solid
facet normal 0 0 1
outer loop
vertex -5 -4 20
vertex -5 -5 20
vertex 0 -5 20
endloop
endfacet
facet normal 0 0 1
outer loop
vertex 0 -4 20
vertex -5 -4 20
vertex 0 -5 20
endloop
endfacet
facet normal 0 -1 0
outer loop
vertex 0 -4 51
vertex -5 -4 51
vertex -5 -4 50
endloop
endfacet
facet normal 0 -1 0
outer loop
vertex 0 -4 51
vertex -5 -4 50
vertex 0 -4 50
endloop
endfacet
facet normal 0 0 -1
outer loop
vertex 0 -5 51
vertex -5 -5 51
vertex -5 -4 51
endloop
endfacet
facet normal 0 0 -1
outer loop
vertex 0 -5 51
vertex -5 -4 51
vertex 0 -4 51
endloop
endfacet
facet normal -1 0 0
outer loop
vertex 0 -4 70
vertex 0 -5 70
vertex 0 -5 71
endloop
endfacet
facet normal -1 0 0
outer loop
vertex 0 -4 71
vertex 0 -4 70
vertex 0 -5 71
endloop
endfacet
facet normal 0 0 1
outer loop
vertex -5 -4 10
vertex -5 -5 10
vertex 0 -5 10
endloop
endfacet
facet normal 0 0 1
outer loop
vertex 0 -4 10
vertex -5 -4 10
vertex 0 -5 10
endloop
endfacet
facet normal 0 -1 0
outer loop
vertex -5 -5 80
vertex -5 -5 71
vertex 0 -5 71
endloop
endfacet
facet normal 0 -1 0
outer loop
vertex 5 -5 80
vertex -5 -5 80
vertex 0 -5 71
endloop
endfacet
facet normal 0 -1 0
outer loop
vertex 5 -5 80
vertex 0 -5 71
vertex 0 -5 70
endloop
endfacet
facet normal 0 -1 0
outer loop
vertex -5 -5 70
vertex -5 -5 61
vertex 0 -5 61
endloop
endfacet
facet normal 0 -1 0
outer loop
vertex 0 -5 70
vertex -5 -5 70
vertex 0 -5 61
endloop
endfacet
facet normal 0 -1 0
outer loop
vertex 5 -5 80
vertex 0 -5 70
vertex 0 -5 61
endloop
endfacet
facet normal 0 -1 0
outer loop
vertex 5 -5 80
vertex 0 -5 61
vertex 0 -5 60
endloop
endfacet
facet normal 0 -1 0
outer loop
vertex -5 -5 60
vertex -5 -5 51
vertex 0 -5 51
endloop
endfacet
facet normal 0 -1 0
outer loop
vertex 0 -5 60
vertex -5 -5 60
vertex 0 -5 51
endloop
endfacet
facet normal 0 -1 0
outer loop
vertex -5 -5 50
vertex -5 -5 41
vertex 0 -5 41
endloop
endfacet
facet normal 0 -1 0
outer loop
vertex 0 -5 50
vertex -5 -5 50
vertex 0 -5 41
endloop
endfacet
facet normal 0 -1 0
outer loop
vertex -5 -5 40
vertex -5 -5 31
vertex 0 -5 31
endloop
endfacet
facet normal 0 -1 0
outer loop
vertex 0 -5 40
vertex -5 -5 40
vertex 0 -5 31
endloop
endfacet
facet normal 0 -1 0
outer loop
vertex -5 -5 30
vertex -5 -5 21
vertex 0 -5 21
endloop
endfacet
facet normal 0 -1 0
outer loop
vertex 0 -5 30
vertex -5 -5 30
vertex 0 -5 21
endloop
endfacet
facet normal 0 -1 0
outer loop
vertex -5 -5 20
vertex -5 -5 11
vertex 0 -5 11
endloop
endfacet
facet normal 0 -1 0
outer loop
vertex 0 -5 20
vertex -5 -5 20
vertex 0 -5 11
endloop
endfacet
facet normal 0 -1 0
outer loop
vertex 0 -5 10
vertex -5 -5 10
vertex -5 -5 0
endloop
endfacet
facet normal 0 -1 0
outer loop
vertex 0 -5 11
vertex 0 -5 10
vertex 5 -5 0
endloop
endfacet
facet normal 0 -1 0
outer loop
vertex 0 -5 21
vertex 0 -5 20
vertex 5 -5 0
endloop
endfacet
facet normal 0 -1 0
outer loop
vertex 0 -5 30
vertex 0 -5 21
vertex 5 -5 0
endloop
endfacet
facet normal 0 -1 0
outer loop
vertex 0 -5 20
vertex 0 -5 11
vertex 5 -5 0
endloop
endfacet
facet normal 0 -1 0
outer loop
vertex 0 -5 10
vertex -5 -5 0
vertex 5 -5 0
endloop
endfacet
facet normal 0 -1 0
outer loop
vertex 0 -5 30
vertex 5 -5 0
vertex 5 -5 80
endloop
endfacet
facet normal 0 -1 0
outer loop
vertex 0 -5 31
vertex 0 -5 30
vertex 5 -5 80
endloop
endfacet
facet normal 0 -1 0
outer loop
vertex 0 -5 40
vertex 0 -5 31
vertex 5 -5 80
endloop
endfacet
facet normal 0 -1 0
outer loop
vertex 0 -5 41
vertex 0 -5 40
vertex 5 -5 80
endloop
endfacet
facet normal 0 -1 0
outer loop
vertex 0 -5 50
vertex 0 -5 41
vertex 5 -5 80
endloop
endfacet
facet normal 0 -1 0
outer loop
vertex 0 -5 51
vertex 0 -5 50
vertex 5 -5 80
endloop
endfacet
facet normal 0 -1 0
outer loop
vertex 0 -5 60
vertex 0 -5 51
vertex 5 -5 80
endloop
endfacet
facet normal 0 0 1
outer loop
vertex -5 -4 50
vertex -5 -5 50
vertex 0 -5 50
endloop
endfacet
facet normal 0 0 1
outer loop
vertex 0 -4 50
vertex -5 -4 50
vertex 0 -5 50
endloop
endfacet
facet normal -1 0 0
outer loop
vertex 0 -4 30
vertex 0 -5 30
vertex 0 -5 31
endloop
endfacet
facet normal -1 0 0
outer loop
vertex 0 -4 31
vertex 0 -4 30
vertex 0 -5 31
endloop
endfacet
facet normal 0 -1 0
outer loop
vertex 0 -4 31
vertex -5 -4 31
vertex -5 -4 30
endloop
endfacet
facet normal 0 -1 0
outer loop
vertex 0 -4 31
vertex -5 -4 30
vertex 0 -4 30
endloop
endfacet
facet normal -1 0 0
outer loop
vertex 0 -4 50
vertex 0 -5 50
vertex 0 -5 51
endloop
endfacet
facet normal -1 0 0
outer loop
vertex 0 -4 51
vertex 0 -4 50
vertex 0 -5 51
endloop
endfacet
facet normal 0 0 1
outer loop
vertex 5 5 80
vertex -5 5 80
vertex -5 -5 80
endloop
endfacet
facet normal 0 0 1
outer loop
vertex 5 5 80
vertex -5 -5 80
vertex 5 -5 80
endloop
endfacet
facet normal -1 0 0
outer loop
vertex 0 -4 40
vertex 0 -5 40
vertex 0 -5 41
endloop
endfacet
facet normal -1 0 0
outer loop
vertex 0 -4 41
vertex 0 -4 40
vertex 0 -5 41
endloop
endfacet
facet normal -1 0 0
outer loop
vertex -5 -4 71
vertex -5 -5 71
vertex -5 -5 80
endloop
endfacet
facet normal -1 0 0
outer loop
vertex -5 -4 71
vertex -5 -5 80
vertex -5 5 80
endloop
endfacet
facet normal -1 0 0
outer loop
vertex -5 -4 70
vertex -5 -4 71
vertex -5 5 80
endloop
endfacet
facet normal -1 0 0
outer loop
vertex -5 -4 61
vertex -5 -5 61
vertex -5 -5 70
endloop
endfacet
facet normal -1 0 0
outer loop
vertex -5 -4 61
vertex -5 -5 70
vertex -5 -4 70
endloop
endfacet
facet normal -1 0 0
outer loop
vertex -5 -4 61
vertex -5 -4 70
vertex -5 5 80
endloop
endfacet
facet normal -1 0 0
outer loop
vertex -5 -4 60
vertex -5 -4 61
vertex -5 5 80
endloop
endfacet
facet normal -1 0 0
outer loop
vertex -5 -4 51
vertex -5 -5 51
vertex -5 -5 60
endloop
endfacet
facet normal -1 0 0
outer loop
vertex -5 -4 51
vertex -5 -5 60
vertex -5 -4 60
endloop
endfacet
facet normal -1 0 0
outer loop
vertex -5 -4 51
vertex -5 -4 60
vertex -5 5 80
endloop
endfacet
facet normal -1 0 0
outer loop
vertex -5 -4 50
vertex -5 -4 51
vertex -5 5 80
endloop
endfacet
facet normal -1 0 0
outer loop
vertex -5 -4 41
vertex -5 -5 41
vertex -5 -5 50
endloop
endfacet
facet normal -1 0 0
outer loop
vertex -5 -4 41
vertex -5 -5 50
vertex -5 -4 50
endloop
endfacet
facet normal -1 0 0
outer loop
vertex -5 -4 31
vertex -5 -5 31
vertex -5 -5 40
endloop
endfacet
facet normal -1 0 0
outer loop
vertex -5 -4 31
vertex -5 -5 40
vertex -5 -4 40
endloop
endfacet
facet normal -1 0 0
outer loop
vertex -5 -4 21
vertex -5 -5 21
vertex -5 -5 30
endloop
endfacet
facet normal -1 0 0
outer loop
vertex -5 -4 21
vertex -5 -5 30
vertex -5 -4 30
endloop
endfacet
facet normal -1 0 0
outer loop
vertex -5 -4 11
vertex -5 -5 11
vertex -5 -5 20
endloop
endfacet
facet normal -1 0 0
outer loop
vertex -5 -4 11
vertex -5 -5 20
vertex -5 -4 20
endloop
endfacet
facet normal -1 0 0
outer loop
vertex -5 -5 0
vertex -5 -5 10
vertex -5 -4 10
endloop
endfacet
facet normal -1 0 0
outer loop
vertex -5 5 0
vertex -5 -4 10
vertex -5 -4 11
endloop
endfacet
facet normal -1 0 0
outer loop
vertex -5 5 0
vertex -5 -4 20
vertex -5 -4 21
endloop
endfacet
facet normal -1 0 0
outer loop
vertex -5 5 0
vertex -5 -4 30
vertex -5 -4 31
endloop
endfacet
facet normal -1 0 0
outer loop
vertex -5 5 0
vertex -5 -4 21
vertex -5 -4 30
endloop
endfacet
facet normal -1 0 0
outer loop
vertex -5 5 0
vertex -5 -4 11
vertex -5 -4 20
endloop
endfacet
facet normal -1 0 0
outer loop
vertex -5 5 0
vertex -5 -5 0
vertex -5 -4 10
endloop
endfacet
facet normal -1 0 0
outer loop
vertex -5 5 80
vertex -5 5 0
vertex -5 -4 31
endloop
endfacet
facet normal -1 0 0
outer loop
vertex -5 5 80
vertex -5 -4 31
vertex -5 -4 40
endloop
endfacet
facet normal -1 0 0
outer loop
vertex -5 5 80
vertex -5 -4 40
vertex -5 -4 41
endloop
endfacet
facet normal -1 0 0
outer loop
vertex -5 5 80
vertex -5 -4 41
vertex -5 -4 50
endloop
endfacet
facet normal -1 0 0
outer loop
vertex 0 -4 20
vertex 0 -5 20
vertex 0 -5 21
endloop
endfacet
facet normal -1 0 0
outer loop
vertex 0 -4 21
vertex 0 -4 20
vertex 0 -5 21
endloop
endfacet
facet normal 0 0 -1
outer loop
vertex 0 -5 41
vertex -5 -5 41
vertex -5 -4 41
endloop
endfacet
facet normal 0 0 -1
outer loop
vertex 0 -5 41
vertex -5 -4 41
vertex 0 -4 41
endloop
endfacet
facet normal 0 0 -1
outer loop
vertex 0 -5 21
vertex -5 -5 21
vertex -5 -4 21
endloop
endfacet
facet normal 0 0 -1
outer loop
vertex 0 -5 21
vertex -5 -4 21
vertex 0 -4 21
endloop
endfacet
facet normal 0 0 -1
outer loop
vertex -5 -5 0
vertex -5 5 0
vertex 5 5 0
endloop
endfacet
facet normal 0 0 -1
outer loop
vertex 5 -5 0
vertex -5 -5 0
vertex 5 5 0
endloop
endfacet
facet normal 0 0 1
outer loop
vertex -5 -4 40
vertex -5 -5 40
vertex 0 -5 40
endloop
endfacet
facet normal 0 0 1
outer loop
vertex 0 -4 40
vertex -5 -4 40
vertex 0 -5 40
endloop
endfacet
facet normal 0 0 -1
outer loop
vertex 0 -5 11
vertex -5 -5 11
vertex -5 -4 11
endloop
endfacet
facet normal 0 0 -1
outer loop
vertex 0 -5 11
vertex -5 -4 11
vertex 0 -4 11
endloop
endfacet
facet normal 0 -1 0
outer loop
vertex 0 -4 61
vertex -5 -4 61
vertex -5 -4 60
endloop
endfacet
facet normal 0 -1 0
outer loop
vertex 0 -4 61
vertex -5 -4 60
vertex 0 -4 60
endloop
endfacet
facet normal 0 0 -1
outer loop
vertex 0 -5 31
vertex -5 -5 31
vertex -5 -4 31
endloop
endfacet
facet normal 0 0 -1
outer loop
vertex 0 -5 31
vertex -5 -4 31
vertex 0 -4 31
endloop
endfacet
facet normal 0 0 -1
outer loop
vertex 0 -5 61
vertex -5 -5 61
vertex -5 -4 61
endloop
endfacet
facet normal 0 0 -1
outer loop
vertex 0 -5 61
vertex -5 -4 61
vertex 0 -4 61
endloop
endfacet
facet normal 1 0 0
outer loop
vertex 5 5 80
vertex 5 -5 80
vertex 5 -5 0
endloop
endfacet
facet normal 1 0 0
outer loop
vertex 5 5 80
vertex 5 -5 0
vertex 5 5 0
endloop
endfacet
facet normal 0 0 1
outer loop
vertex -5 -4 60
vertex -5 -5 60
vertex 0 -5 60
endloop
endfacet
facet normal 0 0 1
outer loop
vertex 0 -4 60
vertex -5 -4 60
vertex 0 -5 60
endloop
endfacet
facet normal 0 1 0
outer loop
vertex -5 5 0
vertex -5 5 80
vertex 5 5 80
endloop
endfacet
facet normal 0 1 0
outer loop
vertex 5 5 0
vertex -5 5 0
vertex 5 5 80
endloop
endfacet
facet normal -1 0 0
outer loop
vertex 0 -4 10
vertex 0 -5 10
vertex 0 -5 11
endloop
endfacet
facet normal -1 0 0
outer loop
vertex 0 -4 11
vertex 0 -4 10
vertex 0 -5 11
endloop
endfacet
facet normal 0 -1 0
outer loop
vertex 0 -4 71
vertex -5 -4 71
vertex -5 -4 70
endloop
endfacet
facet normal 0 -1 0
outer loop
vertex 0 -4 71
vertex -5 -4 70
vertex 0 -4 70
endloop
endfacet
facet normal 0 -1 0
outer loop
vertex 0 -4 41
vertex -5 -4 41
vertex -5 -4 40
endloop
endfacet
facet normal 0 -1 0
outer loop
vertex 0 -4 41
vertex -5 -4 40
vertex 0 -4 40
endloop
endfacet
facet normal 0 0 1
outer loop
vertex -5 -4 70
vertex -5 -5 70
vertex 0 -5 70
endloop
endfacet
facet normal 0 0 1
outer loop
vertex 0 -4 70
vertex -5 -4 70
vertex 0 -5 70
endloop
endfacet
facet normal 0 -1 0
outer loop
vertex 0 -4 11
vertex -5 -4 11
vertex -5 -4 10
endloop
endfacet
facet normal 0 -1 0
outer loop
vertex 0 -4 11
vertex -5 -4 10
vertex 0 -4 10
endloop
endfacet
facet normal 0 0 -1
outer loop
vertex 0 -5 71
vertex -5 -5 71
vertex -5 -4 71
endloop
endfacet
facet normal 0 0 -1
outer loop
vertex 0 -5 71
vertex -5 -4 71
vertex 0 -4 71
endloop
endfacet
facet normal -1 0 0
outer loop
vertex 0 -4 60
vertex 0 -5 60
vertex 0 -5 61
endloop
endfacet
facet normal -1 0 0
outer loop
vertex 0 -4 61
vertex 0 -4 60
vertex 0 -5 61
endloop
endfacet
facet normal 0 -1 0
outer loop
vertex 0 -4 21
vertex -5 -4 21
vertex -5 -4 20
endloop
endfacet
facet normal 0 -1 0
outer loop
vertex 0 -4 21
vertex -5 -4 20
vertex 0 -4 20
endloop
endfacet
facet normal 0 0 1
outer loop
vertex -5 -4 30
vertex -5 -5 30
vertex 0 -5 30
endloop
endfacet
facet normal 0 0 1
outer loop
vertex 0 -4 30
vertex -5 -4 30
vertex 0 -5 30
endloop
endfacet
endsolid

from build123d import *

# Parameters (mm, degrees)
F0_W     = 10
F0_H     = 10
F1_DEPTH = 80
F2_W     = 5
F2_H     = 1
F3_DEPTH = 1


with BuildPart() as f1:
    # F0 (on Top) → F1 (new body)
    with BuildSketch(Plane.XY):
        Rectangle(F0_W, F0_H)
    extrude(amount=F1_DEPTH)

    # F2 (on face) → F3 (cut)
    with BuildSketch(Plane.XZ.offset(5)):
        with Locations((-2.5, 70.5)):
            Rectangle(F2_W, F2_H)
        with Locations((-2.5, 60.5)):
            Rectangle(F2_W, F2_H)
        with Locations((-2.5, 50.5)):
            Rectangle(F2_W, F2_H)
        with Locations((-2.5, 40.5)):
            Rectangle(F2_W, F2_H)
        with Locations((-2.5, 30.5)):
            Rectangle(F2_W, F2_H)
        with Locations((-2.5, 20.5)):
            Rectangle(F2_W, F2_H)
        with Locations((-2.5, 10.5)):
            Rectangle(F2_W, F2_H)
    extrude(amount=-F3_DEPTH, mode=Mode.SUBTRACT)


solid = f1.part
